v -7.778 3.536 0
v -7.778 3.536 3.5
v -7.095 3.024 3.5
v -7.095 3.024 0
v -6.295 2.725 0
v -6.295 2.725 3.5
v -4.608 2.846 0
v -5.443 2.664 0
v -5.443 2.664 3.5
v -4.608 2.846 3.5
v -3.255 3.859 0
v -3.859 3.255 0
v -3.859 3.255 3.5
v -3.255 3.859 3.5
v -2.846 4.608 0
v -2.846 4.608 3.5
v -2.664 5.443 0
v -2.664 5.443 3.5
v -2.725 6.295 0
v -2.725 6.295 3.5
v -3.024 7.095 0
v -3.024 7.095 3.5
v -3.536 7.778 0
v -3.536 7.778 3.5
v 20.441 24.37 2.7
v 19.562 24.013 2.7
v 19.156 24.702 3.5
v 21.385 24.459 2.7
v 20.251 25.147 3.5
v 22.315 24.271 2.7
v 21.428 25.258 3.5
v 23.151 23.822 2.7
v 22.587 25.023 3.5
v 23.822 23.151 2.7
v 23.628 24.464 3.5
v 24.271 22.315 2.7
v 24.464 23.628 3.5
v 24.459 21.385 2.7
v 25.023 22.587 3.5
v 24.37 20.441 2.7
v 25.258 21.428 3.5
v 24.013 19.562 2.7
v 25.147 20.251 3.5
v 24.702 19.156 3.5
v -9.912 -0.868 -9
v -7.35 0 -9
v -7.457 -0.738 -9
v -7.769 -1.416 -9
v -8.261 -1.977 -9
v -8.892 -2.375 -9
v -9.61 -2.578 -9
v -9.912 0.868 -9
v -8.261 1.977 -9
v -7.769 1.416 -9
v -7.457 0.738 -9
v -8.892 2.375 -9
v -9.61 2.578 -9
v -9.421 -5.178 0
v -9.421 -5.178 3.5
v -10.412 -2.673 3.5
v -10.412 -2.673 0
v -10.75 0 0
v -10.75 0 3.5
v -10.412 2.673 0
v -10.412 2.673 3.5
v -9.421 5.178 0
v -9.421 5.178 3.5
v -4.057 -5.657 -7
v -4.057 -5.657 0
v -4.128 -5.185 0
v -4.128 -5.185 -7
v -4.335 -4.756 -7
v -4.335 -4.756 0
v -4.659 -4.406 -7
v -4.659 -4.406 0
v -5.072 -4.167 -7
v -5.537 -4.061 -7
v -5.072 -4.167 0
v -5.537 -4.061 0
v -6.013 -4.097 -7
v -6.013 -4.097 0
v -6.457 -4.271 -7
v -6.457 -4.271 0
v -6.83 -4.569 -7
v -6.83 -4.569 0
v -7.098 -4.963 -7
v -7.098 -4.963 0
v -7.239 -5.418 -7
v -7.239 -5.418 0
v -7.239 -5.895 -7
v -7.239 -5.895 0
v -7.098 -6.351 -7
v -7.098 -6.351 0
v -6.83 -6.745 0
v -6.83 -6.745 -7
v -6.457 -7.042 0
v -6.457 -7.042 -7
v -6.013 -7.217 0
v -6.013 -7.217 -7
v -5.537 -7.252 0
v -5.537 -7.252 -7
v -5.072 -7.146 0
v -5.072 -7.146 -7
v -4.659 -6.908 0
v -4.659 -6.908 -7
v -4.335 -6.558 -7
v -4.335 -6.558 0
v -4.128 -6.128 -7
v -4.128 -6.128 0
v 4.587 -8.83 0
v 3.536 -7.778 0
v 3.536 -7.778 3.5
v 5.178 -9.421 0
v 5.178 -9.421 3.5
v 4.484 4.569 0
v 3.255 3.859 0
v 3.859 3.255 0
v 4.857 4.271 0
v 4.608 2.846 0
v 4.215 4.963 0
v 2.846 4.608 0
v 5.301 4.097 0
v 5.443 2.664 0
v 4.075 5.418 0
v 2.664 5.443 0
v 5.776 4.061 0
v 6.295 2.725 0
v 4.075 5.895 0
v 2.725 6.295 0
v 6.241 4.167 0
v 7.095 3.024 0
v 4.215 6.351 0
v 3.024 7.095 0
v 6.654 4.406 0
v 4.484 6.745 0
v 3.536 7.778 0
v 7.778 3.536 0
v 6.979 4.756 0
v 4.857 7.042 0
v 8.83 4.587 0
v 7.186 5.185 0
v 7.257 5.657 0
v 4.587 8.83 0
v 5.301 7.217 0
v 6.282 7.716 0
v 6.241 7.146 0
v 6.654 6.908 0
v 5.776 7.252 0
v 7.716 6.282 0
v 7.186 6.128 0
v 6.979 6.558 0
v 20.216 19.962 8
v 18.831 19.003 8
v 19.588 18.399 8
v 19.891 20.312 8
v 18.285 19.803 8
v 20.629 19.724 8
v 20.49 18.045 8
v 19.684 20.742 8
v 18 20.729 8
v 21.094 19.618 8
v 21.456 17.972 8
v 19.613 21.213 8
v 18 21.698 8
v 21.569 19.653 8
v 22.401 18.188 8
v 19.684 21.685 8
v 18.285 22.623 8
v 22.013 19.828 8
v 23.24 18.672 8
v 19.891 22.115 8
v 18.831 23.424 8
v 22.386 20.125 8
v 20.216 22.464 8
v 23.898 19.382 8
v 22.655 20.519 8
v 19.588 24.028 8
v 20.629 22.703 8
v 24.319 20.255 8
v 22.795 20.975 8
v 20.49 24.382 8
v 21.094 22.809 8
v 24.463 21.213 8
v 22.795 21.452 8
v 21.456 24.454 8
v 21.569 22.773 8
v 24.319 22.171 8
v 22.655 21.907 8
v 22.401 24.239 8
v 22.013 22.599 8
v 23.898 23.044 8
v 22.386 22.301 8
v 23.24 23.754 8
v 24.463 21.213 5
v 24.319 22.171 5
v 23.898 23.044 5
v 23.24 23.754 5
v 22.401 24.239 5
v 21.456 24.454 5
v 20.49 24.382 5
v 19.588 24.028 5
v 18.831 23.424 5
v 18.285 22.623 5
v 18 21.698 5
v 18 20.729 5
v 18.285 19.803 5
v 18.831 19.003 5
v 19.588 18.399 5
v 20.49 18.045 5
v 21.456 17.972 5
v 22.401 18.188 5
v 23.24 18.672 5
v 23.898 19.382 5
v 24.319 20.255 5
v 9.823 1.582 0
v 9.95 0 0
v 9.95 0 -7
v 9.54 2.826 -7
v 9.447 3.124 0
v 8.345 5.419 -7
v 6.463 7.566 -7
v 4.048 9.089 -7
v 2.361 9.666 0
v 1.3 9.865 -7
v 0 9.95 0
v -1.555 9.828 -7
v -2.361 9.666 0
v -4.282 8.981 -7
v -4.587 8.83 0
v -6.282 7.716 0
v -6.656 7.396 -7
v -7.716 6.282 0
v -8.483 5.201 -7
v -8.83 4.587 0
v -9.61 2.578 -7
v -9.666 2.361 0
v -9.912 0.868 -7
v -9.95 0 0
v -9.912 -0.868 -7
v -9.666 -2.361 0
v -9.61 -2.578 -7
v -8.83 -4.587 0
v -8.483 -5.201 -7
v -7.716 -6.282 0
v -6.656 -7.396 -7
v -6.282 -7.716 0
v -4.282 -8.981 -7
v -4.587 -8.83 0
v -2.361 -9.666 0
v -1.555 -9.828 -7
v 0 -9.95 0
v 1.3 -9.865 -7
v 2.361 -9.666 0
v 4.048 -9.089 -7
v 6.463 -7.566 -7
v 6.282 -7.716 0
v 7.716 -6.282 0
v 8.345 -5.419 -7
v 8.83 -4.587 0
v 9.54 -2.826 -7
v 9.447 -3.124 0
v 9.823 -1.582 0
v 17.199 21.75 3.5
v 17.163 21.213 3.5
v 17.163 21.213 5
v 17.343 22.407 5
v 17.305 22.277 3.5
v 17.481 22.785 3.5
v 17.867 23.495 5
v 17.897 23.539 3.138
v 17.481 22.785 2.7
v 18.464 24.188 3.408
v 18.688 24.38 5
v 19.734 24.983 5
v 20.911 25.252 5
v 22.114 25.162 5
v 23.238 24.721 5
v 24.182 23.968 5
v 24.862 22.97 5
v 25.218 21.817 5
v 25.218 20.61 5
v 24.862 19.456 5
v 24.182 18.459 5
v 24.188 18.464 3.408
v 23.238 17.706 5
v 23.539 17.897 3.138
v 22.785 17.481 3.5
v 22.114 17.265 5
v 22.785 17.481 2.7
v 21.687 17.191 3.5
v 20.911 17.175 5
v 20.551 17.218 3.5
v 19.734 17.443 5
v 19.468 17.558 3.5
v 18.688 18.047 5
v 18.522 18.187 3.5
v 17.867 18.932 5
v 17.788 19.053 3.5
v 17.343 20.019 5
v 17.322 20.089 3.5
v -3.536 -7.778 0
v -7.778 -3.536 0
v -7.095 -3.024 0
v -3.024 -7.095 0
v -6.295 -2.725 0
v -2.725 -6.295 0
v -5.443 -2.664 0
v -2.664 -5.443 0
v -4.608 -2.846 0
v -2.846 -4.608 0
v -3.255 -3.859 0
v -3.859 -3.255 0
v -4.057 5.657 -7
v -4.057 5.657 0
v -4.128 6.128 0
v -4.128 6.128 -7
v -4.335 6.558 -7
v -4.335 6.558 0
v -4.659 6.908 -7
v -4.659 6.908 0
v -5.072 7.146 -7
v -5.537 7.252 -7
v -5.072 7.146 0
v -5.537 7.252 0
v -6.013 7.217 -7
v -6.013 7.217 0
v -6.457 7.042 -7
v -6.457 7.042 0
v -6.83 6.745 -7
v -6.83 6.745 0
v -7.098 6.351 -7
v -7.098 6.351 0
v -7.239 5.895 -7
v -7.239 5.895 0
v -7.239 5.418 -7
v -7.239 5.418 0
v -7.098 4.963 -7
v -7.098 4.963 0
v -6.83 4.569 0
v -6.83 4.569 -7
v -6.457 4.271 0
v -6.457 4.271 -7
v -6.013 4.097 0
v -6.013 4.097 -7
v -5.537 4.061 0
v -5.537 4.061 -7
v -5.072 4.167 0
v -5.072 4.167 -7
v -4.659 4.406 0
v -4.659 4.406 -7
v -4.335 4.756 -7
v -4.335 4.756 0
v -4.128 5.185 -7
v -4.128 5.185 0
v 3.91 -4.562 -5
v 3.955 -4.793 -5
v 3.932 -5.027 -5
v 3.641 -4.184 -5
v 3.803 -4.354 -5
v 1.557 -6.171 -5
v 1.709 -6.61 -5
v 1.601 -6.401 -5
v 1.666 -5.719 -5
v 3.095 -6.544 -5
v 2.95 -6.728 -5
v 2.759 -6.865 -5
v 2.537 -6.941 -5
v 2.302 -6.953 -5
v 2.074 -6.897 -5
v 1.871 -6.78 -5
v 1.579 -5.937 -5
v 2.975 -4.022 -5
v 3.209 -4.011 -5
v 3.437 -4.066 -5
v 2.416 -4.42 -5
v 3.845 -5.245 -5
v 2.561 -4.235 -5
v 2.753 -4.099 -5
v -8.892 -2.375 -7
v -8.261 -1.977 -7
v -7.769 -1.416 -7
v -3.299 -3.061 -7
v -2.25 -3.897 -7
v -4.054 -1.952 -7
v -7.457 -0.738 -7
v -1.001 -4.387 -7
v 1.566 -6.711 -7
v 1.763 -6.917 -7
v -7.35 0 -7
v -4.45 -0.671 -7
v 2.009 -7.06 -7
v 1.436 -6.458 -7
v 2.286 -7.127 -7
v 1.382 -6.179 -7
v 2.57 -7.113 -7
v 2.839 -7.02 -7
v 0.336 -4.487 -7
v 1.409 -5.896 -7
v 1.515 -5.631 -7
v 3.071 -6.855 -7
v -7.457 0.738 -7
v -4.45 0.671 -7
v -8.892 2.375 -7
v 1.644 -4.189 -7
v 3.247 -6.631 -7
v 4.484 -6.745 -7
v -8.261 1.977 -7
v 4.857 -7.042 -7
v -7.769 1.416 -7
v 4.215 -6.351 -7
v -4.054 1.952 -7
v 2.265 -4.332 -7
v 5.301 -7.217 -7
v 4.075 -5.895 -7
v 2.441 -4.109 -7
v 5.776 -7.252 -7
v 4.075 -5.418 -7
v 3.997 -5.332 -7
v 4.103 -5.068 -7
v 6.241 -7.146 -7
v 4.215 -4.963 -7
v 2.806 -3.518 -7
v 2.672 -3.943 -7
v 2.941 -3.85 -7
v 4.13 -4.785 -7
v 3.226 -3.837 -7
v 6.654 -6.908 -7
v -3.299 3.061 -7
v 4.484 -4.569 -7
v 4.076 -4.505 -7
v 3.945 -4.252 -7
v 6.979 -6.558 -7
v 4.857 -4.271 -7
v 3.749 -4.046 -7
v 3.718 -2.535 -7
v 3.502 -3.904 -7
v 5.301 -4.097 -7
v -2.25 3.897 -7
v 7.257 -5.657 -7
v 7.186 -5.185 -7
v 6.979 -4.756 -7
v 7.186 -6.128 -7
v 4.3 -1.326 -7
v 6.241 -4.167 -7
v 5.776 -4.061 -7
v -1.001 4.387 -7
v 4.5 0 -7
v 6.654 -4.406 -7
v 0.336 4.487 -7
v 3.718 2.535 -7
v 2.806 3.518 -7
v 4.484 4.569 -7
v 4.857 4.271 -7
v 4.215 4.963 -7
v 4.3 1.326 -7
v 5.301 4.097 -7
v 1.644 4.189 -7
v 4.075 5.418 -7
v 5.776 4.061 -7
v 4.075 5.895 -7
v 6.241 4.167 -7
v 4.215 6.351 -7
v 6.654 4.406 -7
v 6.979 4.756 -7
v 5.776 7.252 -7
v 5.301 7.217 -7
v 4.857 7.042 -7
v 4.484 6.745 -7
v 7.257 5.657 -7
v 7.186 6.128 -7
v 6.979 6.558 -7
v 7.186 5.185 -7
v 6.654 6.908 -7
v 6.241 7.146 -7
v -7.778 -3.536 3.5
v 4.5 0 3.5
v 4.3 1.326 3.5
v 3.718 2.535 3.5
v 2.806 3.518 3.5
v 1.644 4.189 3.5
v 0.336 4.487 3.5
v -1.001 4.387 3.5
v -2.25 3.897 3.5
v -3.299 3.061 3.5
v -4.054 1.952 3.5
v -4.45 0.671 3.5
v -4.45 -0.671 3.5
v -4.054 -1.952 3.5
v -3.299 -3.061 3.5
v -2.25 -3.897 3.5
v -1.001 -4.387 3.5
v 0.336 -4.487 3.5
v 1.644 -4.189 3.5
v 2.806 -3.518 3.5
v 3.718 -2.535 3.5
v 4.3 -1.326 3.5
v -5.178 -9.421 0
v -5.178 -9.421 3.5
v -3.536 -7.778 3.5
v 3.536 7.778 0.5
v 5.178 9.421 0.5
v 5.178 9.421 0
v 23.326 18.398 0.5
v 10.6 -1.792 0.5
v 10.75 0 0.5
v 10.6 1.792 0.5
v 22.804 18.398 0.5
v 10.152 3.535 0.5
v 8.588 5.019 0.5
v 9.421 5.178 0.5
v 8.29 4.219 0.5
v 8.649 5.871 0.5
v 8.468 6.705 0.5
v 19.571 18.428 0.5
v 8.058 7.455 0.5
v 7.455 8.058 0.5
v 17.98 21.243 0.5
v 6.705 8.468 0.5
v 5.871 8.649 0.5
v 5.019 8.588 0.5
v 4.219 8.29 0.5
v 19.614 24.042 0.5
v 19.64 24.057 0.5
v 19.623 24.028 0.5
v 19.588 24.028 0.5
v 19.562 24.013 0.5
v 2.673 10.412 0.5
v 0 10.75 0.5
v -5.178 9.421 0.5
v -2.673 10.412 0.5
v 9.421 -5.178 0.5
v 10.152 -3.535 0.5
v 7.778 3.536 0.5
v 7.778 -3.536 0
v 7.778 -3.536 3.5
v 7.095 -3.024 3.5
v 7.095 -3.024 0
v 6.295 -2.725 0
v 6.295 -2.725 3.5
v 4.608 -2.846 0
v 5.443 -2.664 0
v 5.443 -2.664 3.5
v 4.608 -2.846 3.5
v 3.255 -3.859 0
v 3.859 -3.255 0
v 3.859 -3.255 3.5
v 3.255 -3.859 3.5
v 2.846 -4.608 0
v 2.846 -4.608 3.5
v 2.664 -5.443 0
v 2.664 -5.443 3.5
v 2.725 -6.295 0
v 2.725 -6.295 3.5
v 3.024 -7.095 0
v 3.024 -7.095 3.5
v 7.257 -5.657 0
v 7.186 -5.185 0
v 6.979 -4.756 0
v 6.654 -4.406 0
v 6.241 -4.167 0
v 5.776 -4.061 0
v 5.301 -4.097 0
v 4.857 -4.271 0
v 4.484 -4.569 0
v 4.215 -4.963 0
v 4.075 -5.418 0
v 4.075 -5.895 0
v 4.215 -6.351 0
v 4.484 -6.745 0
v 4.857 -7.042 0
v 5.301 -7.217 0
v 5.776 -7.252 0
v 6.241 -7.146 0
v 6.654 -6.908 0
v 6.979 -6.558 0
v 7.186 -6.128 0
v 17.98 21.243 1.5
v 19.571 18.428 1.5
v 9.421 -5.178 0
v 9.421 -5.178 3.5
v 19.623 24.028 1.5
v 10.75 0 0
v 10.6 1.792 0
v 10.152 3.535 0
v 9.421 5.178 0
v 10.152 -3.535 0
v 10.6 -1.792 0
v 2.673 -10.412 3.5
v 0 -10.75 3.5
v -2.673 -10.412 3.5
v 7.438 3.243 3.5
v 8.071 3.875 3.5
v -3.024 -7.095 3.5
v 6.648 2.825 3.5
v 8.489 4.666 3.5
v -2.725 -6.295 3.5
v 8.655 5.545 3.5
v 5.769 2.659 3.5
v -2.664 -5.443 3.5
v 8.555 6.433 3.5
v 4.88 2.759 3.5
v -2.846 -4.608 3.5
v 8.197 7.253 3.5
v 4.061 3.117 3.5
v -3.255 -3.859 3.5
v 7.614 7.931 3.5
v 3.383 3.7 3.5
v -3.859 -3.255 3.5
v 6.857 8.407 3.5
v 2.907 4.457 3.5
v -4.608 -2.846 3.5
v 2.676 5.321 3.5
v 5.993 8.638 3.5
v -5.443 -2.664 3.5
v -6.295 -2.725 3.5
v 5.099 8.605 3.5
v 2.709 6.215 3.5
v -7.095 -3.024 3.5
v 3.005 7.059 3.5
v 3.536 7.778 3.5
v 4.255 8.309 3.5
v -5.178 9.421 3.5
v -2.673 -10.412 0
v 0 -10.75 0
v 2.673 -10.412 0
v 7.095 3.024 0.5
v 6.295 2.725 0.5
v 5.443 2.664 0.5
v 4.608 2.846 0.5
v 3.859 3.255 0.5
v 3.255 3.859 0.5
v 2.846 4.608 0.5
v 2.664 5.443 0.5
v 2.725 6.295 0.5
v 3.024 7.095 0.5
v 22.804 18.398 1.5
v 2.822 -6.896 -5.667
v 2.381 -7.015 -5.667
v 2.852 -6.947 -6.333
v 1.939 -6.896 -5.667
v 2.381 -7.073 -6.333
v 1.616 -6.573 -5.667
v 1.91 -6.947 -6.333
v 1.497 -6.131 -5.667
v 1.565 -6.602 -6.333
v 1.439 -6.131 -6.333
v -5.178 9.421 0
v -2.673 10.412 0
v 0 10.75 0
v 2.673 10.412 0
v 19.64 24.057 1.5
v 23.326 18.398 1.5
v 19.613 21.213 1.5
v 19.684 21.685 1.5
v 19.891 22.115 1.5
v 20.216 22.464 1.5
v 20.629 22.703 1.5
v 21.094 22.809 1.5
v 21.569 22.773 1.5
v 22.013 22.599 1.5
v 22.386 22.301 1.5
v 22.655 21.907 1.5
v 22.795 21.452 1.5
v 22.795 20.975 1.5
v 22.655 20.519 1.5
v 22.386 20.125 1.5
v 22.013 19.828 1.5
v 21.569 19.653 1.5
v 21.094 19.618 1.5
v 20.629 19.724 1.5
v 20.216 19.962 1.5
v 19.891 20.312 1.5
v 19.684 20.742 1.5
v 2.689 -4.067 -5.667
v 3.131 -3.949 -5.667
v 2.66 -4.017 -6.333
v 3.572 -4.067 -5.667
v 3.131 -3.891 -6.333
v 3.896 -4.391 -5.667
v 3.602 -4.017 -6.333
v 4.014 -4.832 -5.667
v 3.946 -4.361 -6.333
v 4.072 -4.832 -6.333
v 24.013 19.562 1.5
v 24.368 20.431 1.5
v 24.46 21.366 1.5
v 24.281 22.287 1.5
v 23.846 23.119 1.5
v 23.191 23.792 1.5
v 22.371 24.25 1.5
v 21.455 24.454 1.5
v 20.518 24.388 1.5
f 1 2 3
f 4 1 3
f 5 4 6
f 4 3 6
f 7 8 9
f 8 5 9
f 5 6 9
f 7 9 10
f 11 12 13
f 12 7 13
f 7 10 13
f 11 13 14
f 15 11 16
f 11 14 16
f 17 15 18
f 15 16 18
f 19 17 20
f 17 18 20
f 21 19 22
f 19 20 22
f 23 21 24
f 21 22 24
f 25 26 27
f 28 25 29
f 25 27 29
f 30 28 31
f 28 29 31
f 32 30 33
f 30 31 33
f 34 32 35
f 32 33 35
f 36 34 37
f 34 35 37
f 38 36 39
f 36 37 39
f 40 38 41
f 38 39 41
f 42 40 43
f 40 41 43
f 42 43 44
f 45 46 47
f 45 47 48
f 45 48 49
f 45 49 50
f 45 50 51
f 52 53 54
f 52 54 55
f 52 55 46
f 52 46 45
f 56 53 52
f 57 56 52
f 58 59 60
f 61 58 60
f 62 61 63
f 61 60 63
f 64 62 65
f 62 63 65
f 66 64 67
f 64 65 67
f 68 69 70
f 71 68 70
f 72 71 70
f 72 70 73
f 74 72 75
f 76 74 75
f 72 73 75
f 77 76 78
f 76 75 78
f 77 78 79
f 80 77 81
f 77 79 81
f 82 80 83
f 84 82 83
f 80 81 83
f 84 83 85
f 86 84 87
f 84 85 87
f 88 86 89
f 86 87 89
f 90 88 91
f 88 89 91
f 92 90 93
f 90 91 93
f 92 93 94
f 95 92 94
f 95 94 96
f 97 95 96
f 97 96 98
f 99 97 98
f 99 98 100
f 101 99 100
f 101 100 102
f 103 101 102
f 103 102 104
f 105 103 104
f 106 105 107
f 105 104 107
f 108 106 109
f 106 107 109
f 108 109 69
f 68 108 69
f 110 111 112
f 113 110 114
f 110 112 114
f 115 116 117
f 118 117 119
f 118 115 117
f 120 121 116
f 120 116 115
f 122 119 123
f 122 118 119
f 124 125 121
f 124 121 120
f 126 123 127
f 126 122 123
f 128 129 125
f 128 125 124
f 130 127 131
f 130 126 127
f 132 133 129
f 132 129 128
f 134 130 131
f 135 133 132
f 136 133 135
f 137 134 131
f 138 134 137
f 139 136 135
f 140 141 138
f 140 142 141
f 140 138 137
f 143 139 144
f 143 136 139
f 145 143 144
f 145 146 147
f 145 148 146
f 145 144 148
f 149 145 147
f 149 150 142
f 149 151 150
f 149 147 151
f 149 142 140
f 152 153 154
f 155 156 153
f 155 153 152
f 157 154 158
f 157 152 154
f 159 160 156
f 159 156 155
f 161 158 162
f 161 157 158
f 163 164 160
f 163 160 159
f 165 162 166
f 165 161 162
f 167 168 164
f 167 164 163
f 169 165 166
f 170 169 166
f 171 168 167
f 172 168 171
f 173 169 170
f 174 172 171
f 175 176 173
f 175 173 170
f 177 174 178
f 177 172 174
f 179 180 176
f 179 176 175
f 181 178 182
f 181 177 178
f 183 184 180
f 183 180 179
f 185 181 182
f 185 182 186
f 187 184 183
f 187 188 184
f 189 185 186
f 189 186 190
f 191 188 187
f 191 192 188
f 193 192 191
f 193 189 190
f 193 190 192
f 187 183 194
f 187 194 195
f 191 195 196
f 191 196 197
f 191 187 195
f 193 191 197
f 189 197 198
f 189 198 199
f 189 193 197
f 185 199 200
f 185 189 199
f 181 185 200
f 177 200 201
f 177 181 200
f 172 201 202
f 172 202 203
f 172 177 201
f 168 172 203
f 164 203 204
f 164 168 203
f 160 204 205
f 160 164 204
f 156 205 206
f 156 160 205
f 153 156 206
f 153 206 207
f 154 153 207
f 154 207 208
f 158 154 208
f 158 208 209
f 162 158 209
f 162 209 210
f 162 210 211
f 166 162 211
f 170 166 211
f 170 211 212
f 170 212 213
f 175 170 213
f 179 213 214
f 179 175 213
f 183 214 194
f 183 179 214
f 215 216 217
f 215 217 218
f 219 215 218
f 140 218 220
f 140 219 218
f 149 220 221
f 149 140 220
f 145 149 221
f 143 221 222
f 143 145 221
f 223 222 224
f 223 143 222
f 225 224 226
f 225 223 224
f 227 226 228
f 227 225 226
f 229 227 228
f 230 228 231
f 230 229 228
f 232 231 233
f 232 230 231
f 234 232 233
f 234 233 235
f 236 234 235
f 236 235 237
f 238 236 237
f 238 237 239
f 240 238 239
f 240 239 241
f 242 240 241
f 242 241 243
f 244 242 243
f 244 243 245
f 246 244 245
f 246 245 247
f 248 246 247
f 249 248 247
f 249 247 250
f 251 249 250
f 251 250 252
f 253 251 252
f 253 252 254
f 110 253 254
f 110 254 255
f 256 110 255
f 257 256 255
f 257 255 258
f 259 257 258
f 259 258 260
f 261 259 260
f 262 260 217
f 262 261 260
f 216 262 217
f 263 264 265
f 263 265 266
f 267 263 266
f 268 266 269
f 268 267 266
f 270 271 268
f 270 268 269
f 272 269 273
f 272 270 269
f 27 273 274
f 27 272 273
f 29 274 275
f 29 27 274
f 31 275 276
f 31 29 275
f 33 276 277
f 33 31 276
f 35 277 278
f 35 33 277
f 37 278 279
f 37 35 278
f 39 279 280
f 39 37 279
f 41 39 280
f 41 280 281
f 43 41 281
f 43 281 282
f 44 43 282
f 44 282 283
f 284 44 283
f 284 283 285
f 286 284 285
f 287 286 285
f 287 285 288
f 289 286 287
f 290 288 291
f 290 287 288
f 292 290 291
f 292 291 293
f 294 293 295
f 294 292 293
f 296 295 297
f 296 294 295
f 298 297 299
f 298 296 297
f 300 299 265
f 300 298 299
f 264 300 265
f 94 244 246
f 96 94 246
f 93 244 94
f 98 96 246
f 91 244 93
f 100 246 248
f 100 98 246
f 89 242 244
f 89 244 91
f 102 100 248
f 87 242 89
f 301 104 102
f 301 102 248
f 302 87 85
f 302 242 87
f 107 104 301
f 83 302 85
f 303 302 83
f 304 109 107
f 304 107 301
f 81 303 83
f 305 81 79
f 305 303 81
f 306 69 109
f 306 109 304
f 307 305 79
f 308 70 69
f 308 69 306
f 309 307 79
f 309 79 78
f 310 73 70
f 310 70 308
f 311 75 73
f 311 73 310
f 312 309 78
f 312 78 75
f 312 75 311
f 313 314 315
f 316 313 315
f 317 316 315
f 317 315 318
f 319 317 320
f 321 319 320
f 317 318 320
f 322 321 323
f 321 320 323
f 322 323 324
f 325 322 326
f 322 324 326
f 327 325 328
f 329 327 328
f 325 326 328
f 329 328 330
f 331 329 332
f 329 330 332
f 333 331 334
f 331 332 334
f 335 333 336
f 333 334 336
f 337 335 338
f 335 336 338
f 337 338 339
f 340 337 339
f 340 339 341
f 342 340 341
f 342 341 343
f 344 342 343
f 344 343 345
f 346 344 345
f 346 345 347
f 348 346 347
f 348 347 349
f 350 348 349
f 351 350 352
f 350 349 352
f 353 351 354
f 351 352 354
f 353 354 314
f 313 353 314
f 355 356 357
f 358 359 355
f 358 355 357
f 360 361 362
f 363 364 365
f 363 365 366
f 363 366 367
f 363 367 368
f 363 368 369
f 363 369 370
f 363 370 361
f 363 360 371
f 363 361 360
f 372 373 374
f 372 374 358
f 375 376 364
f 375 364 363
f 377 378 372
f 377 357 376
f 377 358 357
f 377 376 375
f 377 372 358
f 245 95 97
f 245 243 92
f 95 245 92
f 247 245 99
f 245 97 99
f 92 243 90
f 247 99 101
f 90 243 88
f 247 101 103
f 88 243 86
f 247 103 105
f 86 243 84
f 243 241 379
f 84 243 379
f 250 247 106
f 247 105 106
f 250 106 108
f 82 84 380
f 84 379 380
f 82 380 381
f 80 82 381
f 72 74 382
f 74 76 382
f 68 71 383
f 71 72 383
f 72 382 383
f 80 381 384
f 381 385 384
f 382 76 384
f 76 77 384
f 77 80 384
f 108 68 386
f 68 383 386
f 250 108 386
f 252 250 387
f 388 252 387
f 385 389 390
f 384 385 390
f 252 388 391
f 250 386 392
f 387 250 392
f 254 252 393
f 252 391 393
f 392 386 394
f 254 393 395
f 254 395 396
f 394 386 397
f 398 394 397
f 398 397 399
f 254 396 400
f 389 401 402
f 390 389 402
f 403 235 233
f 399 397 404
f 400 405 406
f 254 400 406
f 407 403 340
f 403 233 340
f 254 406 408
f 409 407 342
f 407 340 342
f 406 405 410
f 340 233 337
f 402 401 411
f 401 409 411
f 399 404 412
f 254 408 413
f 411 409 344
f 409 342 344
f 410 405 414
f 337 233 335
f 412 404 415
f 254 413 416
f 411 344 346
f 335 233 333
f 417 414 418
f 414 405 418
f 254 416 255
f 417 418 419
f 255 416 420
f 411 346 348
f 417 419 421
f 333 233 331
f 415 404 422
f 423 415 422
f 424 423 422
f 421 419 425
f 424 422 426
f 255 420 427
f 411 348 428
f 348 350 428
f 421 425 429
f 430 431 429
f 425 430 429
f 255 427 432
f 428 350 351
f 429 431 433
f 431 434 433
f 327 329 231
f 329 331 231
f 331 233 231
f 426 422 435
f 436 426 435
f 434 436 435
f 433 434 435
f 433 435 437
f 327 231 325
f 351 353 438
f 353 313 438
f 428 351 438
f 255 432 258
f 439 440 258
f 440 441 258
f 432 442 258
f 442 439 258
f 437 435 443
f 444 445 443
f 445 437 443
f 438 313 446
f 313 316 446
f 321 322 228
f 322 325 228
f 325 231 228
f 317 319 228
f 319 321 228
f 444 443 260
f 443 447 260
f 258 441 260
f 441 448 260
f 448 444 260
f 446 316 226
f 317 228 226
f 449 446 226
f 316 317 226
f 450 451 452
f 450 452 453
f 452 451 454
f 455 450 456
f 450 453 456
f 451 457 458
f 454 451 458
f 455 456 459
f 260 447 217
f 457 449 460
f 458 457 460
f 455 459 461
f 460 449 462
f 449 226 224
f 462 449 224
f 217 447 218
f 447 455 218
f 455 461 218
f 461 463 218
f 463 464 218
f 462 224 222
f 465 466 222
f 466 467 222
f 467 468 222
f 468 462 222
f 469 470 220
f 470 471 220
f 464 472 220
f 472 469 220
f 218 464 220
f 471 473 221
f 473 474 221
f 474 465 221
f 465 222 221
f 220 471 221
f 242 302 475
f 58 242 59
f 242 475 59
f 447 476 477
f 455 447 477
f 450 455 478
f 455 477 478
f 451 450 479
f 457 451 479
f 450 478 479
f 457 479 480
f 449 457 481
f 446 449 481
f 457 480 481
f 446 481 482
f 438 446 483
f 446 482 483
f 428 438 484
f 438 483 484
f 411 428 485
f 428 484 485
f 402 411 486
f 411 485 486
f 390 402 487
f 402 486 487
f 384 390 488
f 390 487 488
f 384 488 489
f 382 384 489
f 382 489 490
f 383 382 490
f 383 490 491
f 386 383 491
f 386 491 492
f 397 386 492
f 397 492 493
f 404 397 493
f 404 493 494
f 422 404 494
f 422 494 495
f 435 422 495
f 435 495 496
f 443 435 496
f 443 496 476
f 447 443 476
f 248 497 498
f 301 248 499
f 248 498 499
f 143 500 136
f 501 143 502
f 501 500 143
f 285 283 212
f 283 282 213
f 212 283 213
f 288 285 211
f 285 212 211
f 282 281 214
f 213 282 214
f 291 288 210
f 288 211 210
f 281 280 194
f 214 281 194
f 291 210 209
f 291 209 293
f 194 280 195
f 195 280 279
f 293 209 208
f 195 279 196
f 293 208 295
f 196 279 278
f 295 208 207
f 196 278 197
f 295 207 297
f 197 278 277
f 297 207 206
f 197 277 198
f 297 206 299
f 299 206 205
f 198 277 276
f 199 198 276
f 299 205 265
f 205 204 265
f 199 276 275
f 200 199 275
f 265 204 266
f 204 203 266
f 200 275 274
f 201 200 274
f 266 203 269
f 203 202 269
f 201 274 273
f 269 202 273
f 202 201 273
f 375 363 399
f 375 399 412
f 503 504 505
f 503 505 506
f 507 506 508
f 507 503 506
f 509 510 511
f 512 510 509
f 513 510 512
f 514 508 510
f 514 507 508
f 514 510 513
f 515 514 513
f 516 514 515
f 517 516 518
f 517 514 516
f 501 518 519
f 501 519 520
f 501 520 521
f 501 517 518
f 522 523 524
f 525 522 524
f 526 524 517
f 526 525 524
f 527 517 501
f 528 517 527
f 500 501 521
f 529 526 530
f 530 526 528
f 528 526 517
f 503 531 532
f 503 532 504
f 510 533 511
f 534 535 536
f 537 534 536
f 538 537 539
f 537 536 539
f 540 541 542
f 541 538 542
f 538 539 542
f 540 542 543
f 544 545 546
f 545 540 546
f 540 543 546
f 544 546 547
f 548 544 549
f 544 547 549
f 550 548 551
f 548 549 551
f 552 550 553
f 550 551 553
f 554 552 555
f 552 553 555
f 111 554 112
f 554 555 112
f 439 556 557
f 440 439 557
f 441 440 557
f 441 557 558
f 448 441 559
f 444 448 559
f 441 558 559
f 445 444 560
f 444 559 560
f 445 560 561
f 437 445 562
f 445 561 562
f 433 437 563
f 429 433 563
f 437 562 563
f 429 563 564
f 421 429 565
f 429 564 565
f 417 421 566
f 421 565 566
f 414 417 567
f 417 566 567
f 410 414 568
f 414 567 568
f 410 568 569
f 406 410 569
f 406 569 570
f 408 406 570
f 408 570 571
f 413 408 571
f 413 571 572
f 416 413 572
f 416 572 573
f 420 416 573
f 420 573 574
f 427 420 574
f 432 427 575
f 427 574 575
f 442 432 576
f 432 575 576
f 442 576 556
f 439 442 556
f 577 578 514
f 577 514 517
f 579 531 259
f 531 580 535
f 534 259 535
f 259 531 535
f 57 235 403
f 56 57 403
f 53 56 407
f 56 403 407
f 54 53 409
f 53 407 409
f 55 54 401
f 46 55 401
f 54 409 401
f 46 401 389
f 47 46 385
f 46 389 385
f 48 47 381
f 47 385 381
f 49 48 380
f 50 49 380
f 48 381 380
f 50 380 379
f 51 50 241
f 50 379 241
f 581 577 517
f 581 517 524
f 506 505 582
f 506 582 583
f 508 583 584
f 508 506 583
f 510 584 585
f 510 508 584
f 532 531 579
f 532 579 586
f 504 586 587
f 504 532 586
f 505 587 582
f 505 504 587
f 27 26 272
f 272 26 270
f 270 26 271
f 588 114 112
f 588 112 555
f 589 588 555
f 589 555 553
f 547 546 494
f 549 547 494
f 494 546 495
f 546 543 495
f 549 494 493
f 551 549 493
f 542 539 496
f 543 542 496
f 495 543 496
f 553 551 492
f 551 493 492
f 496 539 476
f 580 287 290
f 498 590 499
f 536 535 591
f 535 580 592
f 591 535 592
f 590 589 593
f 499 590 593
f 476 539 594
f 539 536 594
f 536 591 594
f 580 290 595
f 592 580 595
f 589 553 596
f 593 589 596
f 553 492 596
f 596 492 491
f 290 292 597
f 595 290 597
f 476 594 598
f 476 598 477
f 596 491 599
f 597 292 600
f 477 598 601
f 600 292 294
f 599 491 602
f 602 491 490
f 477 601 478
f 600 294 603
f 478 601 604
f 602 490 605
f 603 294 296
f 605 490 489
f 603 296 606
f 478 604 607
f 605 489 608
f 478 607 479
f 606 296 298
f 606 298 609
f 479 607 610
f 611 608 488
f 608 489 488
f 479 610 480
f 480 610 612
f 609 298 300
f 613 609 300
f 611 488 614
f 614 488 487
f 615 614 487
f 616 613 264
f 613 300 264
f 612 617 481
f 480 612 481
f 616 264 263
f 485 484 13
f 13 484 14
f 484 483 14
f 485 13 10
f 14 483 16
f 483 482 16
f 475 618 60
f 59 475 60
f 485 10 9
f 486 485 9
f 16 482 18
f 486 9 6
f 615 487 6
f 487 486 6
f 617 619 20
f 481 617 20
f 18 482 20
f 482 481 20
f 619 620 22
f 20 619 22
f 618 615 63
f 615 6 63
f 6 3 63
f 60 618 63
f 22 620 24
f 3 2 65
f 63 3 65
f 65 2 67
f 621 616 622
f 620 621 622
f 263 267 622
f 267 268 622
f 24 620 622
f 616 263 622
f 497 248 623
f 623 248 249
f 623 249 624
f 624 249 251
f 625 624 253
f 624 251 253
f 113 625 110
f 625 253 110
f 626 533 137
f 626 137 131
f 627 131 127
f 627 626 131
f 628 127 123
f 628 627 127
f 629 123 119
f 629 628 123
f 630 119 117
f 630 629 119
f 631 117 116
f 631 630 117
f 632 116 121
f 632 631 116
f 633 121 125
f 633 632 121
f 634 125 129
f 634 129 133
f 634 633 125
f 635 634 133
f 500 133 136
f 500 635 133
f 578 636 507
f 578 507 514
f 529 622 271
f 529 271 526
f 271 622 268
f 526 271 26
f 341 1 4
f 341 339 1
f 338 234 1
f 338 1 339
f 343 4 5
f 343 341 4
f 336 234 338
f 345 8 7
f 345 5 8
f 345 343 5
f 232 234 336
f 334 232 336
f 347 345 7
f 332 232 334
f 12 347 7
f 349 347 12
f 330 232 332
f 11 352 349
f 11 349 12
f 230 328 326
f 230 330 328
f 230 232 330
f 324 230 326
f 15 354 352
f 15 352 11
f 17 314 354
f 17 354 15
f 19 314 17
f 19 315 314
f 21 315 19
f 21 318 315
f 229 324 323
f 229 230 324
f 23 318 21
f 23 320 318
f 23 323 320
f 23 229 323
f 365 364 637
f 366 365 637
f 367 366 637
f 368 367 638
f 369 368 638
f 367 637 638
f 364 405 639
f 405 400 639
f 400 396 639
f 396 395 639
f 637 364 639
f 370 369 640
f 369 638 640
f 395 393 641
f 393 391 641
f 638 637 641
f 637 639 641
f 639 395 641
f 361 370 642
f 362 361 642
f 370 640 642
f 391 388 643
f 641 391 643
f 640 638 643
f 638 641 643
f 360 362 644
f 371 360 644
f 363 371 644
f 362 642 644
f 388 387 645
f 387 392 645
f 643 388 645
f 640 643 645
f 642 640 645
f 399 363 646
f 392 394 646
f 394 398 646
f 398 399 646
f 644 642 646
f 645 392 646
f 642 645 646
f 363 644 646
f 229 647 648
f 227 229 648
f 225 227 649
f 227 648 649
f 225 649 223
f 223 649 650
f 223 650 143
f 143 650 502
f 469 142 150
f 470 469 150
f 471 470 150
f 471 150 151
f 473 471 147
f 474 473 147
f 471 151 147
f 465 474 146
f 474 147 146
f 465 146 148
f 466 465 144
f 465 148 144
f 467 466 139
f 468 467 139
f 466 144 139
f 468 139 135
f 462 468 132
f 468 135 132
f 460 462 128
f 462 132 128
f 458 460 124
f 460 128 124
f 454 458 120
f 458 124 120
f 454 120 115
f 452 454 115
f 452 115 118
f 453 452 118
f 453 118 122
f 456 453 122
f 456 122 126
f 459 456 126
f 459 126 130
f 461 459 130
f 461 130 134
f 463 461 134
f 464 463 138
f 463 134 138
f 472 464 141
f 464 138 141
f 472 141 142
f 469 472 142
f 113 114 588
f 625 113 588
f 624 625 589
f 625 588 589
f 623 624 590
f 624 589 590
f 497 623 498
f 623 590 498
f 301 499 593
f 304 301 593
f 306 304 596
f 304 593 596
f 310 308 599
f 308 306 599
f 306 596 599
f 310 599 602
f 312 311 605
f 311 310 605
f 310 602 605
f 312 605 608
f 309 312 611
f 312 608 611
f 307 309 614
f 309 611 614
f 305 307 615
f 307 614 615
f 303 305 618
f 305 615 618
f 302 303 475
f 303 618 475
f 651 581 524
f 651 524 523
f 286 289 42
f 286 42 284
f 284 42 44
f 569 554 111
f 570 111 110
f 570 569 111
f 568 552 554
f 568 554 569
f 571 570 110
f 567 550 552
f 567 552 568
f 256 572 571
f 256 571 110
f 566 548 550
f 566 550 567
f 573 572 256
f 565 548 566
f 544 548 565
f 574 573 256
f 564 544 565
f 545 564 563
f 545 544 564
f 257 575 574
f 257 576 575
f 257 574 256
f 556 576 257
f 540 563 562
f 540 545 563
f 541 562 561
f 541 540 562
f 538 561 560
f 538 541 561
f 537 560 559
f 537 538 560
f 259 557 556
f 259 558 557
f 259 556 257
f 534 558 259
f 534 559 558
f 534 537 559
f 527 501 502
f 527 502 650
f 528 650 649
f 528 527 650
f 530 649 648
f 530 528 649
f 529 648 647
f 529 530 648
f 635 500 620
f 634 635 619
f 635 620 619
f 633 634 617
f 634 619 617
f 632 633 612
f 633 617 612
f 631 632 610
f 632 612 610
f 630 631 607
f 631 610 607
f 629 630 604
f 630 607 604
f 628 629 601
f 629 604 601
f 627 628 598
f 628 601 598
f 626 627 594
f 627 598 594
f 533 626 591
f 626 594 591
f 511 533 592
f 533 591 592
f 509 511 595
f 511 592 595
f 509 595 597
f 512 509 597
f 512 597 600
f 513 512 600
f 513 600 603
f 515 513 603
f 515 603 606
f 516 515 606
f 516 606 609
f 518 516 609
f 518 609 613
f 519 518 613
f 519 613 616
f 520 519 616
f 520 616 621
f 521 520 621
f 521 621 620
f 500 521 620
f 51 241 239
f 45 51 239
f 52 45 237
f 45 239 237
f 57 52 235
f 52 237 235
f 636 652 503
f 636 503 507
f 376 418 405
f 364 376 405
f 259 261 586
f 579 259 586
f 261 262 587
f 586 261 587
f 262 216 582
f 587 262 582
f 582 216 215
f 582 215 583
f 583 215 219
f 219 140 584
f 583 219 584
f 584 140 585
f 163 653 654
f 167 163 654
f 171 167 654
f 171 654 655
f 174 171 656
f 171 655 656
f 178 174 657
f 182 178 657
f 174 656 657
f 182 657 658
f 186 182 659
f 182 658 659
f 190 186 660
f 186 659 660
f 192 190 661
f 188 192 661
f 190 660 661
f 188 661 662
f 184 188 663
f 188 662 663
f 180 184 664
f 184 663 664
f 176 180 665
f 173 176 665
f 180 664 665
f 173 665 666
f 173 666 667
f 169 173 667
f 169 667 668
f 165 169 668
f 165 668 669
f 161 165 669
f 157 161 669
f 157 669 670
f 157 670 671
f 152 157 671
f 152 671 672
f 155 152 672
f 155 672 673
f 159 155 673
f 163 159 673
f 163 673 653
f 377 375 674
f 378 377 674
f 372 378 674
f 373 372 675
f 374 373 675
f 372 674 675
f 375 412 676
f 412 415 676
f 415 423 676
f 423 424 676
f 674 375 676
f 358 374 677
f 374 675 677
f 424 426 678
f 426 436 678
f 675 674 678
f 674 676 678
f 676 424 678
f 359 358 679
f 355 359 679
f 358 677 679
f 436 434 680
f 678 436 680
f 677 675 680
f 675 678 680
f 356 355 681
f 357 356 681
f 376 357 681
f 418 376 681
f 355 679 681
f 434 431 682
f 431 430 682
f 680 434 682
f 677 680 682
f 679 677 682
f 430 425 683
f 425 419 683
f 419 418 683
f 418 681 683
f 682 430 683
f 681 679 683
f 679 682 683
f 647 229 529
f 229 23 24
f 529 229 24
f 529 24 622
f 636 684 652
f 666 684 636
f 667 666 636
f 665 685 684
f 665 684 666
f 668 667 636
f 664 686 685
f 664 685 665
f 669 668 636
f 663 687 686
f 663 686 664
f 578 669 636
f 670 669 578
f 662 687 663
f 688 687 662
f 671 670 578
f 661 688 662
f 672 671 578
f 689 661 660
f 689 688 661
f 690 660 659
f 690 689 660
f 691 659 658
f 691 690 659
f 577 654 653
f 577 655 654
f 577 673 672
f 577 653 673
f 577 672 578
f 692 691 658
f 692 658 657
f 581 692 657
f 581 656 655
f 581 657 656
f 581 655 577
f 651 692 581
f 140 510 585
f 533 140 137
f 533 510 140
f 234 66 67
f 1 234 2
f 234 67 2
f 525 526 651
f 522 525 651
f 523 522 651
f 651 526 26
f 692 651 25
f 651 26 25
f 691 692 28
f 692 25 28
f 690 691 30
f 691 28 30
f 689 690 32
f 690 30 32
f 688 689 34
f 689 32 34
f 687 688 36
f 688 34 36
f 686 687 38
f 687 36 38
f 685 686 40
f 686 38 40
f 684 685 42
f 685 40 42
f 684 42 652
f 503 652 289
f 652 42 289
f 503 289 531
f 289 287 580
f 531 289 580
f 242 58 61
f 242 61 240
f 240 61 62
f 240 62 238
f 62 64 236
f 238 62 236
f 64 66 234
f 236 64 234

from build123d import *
from build123d.topology import SkipClean

# Parameters (mm, degrees)
SKETCH1_R           = 9.95
SKETCH1_R_2         = 4.5
SKETCH1_R_3         = 1.6
BOSS_EXTRUDE1_DEPTH = 7
BOSS_EXTRUDE3_START = 0.5
SKETCH3_R           = 4.5
BOSS_EXTRUDE3_DEPTH = 0.5
BOSS_EXTRUDE4_START = 3
SKETCH5_R           = 3
SKETCH5_R_2         = 4.5
BOSS_EXTRUDE4_DEPTH = 3
SKETCH6_R           = 4.05
BOSS_EXTRUDE5_DEPTH = 1.5
BOSS_EXTRUDE6_START = 3
SKETCH7_R           = 3.25
BOSS_EXTRUDE6_DEPTH = 3
CHAMFER1_SIZE       = 0.8
CUT_EXTRUDE1_START  = -1
CUT_EXTRUDE1_DEPTH  = 1
SKETCH9_R           = 1.6
CUT_EXTRUDE2_DEPTH  = 37.724772234
BOSS_EXTRUDE7_DEPTH = 2
CUT_EXTRUDE3_DEPTH  = 2
CUT_EXTRUDE3_DRAFT  = -5


with BuildPart() as part:
    # Sketch1 → Boss-Extrude1 (new body)
    with BuildSketch(Plane.XY):
        Circle(SKETCH1_R)
        Circle(SKETCH1_R_2, mode=Mode.SUBTRACT)
        with Locations((-5.656854249, -5.656854249)):
            Circle(SKETCH1_R_3, mode=Mode.SUBTRACT)
        with Locations((-5.656854249, 5.656854249)):
            Circle(SKETCH1_R_3, mode=Mode.SUBTRACT)
        with Locations((5.656854249, 5.656854249)):
            Circle(SKETCH1_R_3, mode=Mode.SUBTRACT)
        with Locations((5.656854249, -5.656854249)):
            Circle(SKETCH1_R_3, mode=Mode.SUBTRACT)
    extrude(amount=-BOSS_EXTRUDE1_DEPTH)

    # Sketch3 → Boss-Extrude3 (add)
    # profile 1 of 5: a face of its own
    with BuildSketch(Plane.XY.offset(BOSS_EXTRUDE3_START)):
        with BuildLine():
            ThreePointArc((4.586976758, 8.829617445), (0, 9.95), (-4.586976758, 8.829617445))
            Line((-4.586976758, 8.829617445), (-3.535533906, 7.778174593))
            ThreePointArc((-3.535533906, 7.778174593), (-3.535533906, 3.535533906), (-7.778174593, 3.535533906))
            Line((-7.778174593, 3.535533906), (-8.829617445, 4.586976758))
            ThreePointArc((-8.829617445, 4.586976758), (-9.95, 0), (-8.829617445, -4.586976758))
            Line((-8.829617445, -4.586976758), (-7.778174593, -3.535533906))
            ThreePointArc((-7.778174593, -3.535533906), (-3.535533906, -3.535533906), (-3.535533906, -7.778174593))
            Line((-3.535533906, -7.778174593), (-4.586976758, -8.829617445))
            ThreePointArc((-4.586976758, -8.829617445), (0, -9.95), (4.586976758, -8.829617445))
            Line((4.586976758, -8.829617445), (3.535533906, -7.778174593))
            ThreePointArc((3.535533906, -7.778174593), (3.535533906, -3.535533906), (7.778174593, -3.535533906))
            Line((7.778174593, -3.535533906), (8.829617445, -4.586976758))
            ThreePointArc((8.829617445, -4.586976758), (9.665846926, -2.360911521), (9.95, 0))
            ThreePointArc((9.95, 0), (9.665846926, 2.360911521), (8.829617445, 4.586976758))
            Line((8.829617445, 4.586976758), (7.778174593, 3.535533906))
            ThreePointArc((7.778174593, 3.535533906), (3.535533906, 3.535533906), (3.535533906, 7.778174593))
            Line((3.535533906, 7.778174593), (4.586976758, 8.829617445))
        make_face()
        Circle(SKETCH3_R, mode=Mode.SUBTRACT)
    # profile 2 of 5: a face of its own
    with BuildSketch(Plane.XY.offset(BOSS_EXTRUDE3_START)):
        with BuildLine():
            Line((-8.829617445, 4.586976758), (-9.420721004, 5.178080317))
            ThreePointArc((-9.420721004, 5.178080317), (-10.75, 0), (-9.420721004, -5.178080317))
            Line((-9.420721004, -5.178080317), (-8.829617445, -4.586976758))
            ThreePointArc((-8.829617445, -4.586976758), (-9.95, 0), (-8.829617445, 4.586976758))
        make_face()
    # profile 3 of 5: a face of its own
    with BuildSketch(Plane.XY.offset(BOSS_EXTRUDE3_START)):
        with BuildLine():
            ThreePointArc((5.178080317, 9.420721004), (0, 10.75), (-5.178080317, 9.420721004))
            Line((-5.178080317, 9.420721004), (-4.586976758, 8.829617445))
            ThreePointArc((-4.586976758, 8.829617445), (0, 9.95), (4.586976758, 8.829617445))
            Line((4.586976758, 8.829617445), (5.178080317, 9.420721004))
        make_face()
    # profile 4 of 5: a face of its own
    with BuildSketch(Plane.XY.offset(BOSS_EXTRUDE3_START)):
        with BuildLine():
            ThreePointArc((10.75, 0), (10.41237847, 2.672989825), (9.420721004, 5.178080317))
            Line((9.420721004, 5.178080317), (8.829617445, 4.586976758))
            ThreePointArc((8.829617445, 4.586976758), (9.665846926, 2.360911521), (9.95, 0))
            ThreePointArc((9.95, 0), (9.665846926, -2.360911521), (8.829617445, -4.586976758))
            Line((8.829617445, -4.586976758), (9.420721004, -5.178080317))
            ThreePointArc((9.420721004, -5.178080317), (10.41237847, -2.672989825), (10.75, 0))
        make_face()
    # profile 5 of 5: a face of its own
    with BuildSketch(Plane.XY.offset(BOSS_EXTRUDE3_START)):
        with BuildLine():
            Line((-4.586976758, -8.829617445), (-5.178080317, -9.420721004))
            ThreePointArc((-5.178080317, -9.420721004), (0, -10.75), (5.178080317, -9.420721004))
            Line((5.178080317, -9.420721004), (4.586976758, -8.829617445))
            ThreePointArc((4.586976758, -8.829617445), (0, -9.95), (-4.586976758, -8.829617445))
        make_face()
    extrude(amount=-BOSS_EXTRUDE3_DEPTH)

    # Sketch5 → Boss-Extrude4 (add)
    with SkipClean():  # the faces are left unmerged after this step: merging them gives an invalid solid
        with BuildSketch(Plane.XY.offset(0.5).offset(BOSS_EXTRUDE4_START)):
            with BuildLine():
                Line((-5.178080317, 9.420721004), (19.562128784, 24.012569881))
                ThreePointArc((19.562128784, 24.012569881), (23.511300474, 23.511300474), (24.012569881, 19.562128784))
                Line((24.012569881, 19.562128784), (9.420721004, -5.178080317))
                Line((9.420721004, -5.178080317), (7.778174593, -3.535533906))
                ThreePointArc((7.778174593, -3.535533906), (3.535533906, -3.535533906), (3.535533906, -7.778174593))
                Line((3.535533906, -7.778174593), (5.178080317, -9.420721004))
                ThreePointArc((5.178080317, -9.420721004), (0, -10.75), (-5.178080317, -9.420721004))
                Line((-5.178080317, -9.420721004), (-3.535533906, -7.778174593))
                ThreePointArc((-3.535533906, -7.778174593), (-3.535533906, -3.535533906), (-7.778174593, -3.535533906))
                Line((-7.778174593, -3.535533906), (-9.420721004, -5.178080317))
                ThreePointArc((-9.420721004, -5.178080317), (-10.75, 0), (-9.420721004, 5.178080317))
                Line((-9.420721004, 5.178080317), (-7.778174593, 3.535533906))
                ThreePointArc((-7.778174593, 3.535533906), (-3.535533906, 3.535533906), (-3.535533906, 7.778174593))
                Line((-3.535533906, 7.778174593), (-5.178080317, 9.420721004))
            make_face()
            with Locations(Location((5.656854249, 5.656854249, 0), (0, 0, 135))):
                Circle(SKETCH5_R, mode=Mode.SUBTRACT)
            Circle(SKETCH5_R_2, mode=Mode.SUBTRACT)
        extrude(amount=-BOSS_EXTRUDE4_DEPTH)

    # Sketch6 → Boss-Extrude5 (add)
    with SkipClean():  # the faces are left unmerged after this step: merging them gives an invalid solid
        with BuildSketch(Plane(origin=(0, 0, 3.5), x_dir=(-1, 0, 0), z_dir=(0, 0, -1))):
            with Locations((-21.213203436, 21.213203436)):
                Circle(SKETCH6_R)
        extrude(amount=-BOSS_EXTRUDE5_DEPTH)

    # Sketch7 → Boss-Extrude6 (add)
    with SkipClean():  # the faces are left unmerged after this step: merging them gives an invalid solid
        with BuildSketch(Plane.XY.offset(5).offset(BOSS_EXTRUDE6_START)):
            with Locations((21.213203436, 21.213203436)):
                Circle(SKETCH7_R)
        extrude(amount=-BOSS_EXTRUDE6_DEPTH)

    # Chamfer1
    # the kernel refuses this chamfer: 0.8 mm, written as the material it adds along each edge
    with BuildSketch(Plane(origin=(24.012569881, 19.562128784, 3.5), x_dir=(-0.02368339518990366, 0.013968536890575577, -0.9996219169112968), z_dir=(-0.5080229697131419, -0.8613435216241195, 0))) as chamfer1_piece_1_section:
        Polygon((CHAMFER1_SIZE * 0.999621916911, CHAMFER1_SIZE * 0.0274958766106), (-CHAMFER1_SIZE * 0.0274958766106, CHAMFER1_SIZE * 0.999621916911), (0, 0), align=None)
    chamfer1_piece_1 = extrude(amount=4.473955585, mode=Mode.PRIVATE)
    chamfer1_piece_1 = chamfer1_piece_1 & Plane(origin=(21.213203436, 21.213203436, 3.215245779), x_dir=(-1, 0, 0), z_dir=(0, 0, -1)) * Cylinder(4.05, 13, mode=Mode.PRIVATE)
    add(chamfer1_piece_1)
    with BuildSketch(Plane(origin=(21.213203436, 21.213203436, 3.5), x_dir=(-0.508022969713124, 0.8613435216241301, 0), z_dir=(-0.8613435216241301, -0.508022969713124, 0))) as chamfer1_piece_2:
        Polygon((3.25, CHAMFER1_SIZE), (3.25 + CHAMFER1_SIZE, 0), (3.25, 0), align=None)
    revolve(axis=Axis((21.213203436, 21.213203436, 3.5), (0, 0, -1)), revolution_arc=151.064460502)
    with BuildSketch(Plane(origin=(15.708516125, 21.739697678, 3.5), x_dir=(0.01396853689057517, -0.0236833951899039, -0.9996219169112968), z_dir=(0.8613435216241283, 0.508022969713127, 0))) as chamfer1_piece_3_section:
        Polygon((CHAMFER1_SIZE * 0.999621916911, CHAMFER1_SIZE * 0.0274958766106), (-CHAMFER1_SIZE * 0.0274958766106, CHAMFER1_SIZE * 0.999621916911), (0, 0), align=None)
    chamfer1_piece_3 = extrude(amount=4.473955585, mode=Mode.PRIVATE)
    chamfer1_piece_3 = chamfer1_piece_3 & Plane(origin=(21.213203436, 21.213203436, 3.215245779), x_dir=(-1, 0, 0), z_dir=(0, 0, -1)) * Cylinder(4.05, 13, mode=Mode.PRIVATE)
    add(chamfer1_piece_3)

    # Sketch8 → Cut-Extrude1 (cut)
    with BuildSketch(Plane(origin=(0, 0, 0.5), x_dir=(-1, 0, 0), z_dir=(0, 0, -1)).offset(CUT_EXTRUDE1_START)):
        with BuildLine():
            Line((-22.803705141, 18.398307761), (-19.570683125, 18.428340717))
            Line((-19.570683125, 18.428340717), (-17.98018142, 21.243236391))
            Line((-17.98018142, 21.243236391), (-19.62270173, 24.02809911))
            Line((-19.62270173, 24.02809911), (-19.639679475, 24.056884561))
            ThreePointArc((-19.639679475, 24.056884561), (-23.542662563, 23.479504425), (-24.012569881, 19.562128784))
            Line((-24.012569881, 19.562128784), (-23.326144782, 18.398307761))
            Line((-23.326144782, 18.398307761), (-22.803705141, 18.398307761))
        make_face()
    extrude(amount=CUT_EXTRUDE1_DEPTH, mode=Mode.SUBTRACT)

    # Sketch9 → Cut-Extrude2 (cut, through all)
    with BuildSketch(Plane(origin=(0, 0, 1.5), x_dir=(-1, 0, 0), z_dir=(0, 0, -1))):
        with Locations((-21.213203436, 21.213203436)):
            Circle(SKETCH9_R)
    extrude(amount=-CUT_EXTRUDE2_DEPTH, mode=Mode.SUBTRACT)

    # Sketch10 → Boss-Extrude7 (add)
    with BuildSketch(Plane(origin=(0, 0, -7), x_dir=(-1, 0, 0), z_dir=(0, 0, -1))):
        with BuildLine():
            ThreePointArc((9.610301508, 2.577713121), (7.35, 0), (9.610301508, -2.577713121))
            ThreePointArc((9.610301508, -2.577713121), (9.95, 0), (9.610301508, 2.577713121))
        make_face()
    extrude(amount=BOSS_EXTRUDE7_DEPTH)


with BuildPart() as cut_extrude3_tool:
    # Sketch11 → Cut-Extrude3 (with draft: the straight prism first)
    with BuildSketch(Plane(origin=(0, 0, -7), x_dir=(-1, 0, 0), z_dir=(0, 0, -1))):
        with BuildLine():
            ThreePointArc((-2.26467179, -4.332286617), (-3.630697194, -3.966261214), (-3.996722598, -5.332286617))
            Line((-3.996722598, -5.332286617), (-3.246722598, -6.631324723))
            ThreePointArc((-3.246722598, -6.631324723), (-1.880697194, -6.997350127), (-1.51467179, -5.631324723))
            Line((-1.51467179, -5.631324723), (-2.26467179, -4.332286617))
        make_face()
    extrude(amount=-CUT_EXTRUDE3_DEPTH)
    # Cut-Extrude3: the draft: its side faces are tilted about the plane it starts from
    cut_extrude3_sides = [cut_extrude3_tool.faces().sort_by_distance(p)[0] for p in [
        (1.880697194, -6.997350127, -6),
        (1.88967179, -4.98180567, -6),
        (3.630697194, -3.966261214, -6),
        (3.621722598, -5.98180567, -6),
    ]]
    draft(cut_extrude3_sides, Plane(origin=(0, 0, -7), x_dir=(-1, 0, 0), z_dir=(0, 0, -1)), CUT_EXTRUDE3_DRAFT)


with BuildPart() as part_1:
    add(part.part)

    # Cut-Extrude3: cut by cut_extrude3_tool
    add(cut_extrude3_tool.part, mode=Mode.SUBTRACT)


solid = part_1.part
